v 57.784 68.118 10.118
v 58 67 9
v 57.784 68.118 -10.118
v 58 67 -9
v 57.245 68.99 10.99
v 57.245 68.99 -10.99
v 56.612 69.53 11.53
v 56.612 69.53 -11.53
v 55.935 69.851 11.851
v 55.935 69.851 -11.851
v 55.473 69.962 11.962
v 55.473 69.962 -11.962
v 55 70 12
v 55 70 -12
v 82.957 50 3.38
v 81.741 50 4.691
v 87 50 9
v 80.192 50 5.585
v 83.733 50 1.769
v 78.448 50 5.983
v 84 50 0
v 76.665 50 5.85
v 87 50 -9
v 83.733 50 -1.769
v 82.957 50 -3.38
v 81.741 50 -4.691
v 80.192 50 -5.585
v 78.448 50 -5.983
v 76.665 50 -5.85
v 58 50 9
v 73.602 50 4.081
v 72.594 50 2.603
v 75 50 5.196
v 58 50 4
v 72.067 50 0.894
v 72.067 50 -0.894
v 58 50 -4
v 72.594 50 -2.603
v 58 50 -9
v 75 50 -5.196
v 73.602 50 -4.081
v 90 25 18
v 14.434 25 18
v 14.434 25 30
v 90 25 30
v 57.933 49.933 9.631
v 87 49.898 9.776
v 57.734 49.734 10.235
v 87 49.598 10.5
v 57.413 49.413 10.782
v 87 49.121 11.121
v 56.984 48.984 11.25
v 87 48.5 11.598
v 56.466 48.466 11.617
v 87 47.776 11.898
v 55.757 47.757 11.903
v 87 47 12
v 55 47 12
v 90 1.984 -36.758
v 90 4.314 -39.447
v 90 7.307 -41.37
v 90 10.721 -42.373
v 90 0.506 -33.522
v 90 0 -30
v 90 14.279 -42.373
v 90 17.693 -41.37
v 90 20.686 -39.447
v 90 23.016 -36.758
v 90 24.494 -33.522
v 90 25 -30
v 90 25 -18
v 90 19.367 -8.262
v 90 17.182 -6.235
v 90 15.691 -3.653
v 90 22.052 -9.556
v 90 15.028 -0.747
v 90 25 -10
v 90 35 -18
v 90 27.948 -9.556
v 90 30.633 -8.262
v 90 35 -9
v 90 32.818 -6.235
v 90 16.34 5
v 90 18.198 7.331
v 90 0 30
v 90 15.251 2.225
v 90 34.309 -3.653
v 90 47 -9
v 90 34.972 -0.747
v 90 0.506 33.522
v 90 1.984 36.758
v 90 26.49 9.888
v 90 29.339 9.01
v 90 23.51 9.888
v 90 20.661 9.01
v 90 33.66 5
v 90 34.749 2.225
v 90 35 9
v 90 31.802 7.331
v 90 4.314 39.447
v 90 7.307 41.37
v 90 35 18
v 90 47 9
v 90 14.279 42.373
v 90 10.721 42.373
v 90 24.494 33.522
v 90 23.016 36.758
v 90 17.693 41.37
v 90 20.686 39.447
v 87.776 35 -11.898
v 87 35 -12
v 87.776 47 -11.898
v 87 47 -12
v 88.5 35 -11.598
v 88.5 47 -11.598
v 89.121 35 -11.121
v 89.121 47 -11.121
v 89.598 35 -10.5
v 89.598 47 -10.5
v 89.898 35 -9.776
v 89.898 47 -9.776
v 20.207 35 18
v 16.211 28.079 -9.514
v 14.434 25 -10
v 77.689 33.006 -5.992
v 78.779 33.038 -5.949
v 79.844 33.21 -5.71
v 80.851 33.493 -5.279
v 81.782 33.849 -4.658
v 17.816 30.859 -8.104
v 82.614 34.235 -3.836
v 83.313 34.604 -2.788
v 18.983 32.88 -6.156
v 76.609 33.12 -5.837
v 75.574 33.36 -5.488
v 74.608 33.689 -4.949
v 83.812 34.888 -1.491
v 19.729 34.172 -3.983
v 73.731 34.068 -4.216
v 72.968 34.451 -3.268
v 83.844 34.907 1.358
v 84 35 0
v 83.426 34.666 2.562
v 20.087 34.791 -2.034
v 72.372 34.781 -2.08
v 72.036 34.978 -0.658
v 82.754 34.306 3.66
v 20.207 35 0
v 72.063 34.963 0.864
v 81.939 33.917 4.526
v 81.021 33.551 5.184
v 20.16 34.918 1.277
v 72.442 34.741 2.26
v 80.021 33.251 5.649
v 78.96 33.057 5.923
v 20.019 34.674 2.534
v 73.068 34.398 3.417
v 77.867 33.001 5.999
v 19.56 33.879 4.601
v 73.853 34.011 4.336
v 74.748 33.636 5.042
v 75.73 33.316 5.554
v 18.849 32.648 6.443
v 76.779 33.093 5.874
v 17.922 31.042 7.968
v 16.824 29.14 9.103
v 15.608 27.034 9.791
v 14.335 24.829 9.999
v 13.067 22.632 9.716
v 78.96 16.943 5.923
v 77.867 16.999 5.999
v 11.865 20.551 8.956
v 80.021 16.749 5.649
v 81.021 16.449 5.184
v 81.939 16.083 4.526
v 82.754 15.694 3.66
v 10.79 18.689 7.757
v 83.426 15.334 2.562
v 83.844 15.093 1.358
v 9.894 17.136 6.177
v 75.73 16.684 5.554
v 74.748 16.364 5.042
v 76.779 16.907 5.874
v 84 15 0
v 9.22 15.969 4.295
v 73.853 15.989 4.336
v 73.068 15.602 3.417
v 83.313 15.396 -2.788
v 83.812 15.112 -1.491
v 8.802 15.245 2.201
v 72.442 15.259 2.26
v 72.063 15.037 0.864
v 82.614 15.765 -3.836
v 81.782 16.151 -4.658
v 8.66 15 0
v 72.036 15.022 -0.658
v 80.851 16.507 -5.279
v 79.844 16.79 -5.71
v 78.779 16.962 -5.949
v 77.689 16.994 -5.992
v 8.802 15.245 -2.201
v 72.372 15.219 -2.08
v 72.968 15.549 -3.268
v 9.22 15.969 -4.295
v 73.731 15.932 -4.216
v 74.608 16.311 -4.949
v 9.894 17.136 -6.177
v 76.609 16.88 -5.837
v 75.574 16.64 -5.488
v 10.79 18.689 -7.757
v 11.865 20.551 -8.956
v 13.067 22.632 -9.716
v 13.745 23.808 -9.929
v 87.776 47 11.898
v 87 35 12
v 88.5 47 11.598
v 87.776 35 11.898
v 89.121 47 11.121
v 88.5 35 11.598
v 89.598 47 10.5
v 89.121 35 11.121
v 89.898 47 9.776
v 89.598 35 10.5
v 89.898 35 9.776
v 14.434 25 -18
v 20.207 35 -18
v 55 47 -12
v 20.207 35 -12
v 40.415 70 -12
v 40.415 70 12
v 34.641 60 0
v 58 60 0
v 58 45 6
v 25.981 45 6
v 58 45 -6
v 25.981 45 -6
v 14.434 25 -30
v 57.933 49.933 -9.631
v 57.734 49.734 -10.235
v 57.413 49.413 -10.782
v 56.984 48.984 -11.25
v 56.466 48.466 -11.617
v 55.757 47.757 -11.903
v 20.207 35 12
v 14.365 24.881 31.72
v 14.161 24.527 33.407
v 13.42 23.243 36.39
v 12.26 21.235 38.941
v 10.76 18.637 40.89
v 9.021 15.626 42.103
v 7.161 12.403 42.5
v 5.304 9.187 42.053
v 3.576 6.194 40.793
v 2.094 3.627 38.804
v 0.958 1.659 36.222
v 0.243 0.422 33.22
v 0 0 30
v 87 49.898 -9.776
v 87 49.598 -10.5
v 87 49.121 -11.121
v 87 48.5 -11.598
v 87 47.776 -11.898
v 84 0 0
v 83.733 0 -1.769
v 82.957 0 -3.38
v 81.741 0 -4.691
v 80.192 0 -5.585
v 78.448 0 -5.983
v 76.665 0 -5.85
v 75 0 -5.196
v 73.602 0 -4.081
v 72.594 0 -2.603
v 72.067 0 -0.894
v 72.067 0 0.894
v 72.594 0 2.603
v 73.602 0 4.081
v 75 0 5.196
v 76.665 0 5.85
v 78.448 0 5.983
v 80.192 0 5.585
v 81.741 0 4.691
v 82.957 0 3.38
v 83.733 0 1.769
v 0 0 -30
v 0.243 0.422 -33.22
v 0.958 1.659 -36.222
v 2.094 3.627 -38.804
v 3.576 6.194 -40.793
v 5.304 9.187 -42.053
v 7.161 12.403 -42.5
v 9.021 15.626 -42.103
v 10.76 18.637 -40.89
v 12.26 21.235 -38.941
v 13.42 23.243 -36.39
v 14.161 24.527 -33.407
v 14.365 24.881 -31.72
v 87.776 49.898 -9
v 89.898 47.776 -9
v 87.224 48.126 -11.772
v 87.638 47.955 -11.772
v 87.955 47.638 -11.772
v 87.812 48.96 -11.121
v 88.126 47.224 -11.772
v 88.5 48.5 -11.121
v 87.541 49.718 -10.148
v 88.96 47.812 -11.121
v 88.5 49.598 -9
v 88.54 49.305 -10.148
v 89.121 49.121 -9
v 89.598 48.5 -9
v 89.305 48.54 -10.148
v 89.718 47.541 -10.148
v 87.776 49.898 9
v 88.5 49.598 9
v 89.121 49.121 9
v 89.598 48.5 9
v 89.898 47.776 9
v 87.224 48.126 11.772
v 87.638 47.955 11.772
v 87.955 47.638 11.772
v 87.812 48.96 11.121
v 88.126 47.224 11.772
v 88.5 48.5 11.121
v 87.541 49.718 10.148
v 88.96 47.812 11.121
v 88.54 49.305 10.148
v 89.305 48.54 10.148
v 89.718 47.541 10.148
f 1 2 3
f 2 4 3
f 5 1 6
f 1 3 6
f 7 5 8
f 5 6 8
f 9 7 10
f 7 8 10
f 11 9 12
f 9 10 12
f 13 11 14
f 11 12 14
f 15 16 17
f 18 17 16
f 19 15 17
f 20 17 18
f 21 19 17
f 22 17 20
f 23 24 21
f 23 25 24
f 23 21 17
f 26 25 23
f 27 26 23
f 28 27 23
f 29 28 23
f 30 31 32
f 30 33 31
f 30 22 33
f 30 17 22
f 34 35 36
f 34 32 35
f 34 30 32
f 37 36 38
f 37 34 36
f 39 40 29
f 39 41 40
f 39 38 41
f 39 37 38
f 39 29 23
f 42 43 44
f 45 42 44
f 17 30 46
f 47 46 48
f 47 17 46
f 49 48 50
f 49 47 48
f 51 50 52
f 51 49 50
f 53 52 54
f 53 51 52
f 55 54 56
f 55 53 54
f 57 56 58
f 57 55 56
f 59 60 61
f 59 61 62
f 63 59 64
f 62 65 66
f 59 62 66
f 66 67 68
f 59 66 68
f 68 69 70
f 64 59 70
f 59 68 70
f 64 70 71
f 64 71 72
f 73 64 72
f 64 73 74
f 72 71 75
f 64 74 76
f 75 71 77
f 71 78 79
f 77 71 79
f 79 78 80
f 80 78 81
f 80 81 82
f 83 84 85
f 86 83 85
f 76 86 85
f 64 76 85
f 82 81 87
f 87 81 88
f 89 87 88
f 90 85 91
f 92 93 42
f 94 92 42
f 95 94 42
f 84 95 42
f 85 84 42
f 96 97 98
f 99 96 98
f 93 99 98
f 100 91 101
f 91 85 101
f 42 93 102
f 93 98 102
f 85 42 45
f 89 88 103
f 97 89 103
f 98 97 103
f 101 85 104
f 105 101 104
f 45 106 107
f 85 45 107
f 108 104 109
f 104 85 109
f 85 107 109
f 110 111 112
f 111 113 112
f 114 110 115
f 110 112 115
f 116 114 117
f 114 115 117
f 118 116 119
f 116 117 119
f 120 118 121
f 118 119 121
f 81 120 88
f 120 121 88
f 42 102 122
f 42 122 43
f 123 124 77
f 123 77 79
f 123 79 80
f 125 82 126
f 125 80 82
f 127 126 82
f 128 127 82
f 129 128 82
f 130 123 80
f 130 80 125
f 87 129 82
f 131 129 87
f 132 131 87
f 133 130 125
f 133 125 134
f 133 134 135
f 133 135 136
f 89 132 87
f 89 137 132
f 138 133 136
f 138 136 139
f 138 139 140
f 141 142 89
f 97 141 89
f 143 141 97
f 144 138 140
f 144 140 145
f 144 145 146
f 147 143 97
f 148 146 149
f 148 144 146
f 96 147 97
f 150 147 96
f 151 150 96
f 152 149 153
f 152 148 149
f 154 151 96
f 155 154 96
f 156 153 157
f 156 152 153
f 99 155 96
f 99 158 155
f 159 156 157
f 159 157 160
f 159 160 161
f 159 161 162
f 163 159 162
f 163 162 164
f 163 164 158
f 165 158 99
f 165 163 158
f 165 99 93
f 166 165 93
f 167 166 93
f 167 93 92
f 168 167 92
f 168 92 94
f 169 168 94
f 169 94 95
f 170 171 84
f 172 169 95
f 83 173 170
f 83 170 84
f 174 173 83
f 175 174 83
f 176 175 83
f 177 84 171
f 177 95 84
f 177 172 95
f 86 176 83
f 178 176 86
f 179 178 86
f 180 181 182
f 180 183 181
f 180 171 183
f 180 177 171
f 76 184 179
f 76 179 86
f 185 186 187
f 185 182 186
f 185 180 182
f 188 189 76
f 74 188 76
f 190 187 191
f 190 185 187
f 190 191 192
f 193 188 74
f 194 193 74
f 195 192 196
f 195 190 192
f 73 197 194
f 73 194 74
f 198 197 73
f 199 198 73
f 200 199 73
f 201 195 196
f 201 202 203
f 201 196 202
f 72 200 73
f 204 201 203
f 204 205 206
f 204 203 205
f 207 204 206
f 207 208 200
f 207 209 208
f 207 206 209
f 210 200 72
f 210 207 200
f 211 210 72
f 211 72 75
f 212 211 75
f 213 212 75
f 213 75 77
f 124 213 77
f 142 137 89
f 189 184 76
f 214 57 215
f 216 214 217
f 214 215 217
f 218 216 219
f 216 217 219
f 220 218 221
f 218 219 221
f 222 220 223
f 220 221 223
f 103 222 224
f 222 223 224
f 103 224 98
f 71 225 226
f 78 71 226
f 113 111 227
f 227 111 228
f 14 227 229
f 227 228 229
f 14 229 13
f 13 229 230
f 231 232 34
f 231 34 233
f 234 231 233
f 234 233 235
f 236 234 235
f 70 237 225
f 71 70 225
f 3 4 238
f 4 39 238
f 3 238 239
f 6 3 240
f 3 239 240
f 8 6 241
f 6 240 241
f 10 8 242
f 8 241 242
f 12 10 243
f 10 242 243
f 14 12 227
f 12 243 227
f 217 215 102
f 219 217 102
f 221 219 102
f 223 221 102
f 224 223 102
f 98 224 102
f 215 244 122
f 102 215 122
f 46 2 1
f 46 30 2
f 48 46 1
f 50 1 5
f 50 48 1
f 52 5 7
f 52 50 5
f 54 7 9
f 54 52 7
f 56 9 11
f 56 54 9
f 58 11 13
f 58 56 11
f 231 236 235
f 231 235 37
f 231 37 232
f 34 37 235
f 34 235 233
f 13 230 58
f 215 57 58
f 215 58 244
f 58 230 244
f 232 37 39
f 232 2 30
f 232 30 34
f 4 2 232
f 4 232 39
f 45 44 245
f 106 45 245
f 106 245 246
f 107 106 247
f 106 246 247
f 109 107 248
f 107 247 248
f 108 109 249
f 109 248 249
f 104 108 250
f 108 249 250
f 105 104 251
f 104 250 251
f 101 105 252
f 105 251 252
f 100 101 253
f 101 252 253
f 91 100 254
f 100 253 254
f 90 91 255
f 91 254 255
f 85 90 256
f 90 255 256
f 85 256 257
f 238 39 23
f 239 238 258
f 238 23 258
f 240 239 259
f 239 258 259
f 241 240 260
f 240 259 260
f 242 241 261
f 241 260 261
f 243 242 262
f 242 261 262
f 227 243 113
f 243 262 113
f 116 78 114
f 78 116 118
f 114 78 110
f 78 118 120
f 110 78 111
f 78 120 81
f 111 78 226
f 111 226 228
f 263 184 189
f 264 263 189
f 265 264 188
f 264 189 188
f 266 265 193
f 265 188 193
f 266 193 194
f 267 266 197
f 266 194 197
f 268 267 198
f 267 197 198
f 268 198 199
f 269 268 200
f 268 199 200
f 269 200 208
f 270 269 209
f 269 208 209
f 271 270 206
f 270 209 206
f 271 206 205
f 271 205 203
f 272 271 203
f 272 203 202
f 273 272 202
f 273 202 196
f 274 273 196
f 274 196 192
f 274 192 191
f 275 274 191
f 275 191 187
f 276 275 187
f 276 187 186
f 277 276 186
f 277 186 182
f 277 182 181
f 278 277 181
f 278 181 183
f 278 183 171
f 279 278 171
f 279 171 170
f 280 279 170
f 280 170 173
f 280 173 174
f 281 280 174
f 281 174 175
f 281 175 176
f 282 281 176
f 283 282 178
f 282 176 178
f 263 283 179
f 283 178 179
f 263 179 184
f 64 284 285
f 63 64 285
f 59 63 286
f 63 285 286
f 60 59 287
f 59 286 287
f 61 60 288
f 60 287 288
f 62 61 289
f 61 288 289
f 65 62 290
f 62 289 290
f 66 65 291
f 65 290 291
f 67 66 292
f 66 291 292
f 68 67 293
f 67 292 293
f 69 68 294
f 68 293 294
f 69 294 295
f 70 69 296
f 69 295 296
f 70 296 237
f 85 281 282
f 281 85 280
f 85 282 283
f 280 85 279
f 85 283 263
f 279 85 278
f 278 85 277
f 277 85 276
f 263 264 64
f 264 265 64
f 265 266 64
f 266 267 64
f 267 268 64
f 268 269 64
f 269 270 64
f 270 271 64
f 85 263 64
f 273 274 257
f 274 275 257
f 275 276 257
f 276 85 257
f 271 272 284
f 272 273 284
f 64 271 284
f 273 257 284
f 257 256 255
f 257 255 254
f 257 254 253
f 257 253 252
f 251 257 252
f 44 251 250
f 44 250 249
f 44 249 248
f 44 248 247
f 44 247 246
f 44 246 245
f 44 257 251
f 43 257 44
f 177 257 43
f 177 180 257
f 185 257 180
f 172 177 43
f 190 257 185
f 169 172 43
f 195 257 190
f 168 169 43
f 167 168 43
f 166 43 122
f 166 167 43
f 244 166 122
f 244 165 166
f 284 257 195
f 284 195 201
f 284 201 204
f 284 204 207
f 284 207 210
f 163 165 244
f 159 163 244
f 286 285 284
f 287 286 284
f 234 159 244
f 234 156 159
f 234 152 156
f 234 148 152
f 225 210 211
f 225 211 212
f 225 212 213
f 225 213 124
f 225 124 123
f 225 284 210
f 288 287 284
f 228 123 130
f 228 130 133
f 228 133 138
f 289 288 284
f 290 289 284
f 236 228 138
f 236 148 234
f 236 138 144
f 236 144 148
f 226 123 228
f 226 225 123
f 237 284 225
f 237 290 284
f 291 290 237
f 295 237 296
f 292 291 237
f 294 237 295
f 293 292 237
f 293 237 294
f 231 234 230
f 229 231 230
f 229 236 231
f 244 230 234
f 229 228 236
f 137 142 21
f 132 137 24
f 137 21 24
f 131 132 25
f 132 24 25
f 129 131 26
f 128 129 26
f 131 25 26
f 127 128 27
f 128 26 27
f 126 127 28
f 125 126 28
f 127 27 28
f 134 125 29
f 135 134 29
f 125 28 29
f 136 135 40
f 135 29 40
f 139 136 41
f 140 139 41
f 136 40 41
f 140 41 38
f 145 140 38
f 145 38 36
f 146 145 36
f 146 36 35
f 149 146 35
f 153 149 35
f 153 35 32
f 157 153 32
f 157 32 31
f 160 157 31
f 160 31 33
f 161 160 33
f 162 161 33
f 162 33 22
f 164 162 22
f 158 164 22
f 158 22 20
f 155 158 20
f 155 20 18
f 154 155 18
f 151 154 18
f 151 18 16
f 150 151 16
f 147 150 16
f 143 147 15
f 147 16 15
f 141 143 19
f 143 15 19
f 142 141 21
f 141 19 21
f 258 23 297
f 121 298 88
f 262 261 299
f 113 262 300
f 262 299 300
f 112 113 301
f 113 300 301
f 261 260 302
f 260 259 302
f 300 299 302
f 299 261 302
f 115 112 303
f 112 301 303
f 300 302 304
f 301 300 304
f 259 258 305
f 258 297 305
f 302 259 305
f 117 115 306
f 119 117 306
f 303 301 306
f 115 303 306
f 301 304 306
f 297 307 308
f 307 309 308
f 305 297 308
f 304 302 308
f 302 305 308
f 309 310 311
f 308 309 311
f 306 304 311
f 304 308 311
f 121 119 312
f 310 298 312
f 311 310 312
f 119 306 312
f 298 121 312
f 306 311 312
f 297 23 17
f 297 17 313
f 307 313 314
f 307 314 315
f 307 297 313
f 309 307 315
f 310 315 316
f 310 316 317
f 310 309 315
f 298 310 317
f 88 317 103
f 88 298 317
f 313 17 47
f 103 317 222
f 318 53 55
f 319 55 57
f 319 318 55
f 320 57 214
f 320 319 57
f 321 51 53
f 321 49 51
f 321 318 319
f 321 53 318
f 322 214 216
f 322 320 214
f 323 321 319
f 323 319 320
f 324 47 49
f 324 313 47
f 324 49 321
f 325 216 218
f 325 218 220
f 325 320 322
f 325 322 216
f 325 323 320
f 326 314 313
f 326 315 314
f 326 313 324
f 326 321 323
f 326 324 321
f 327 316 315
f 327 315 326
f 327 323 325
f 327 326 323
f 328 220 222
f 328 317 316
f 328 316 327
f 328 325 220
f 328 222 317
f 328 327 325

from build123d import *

# Parameters (mm, degrees)
SKETCH1_R               = 10
BOSS_EXTRUDE1_DEPTH     = 90
CUT_EXTRUDE1_DEPTH      = 46
CUT_EXTRUDE1_DEPTH_BACK = 57
SKETCH3_W               = 32
SKETCH3_H               = 24
CUT_EXTRUDE2_DEPTH      = 20
BOSS_EXTRUDE2_DEPTH     = 32
SKETCH5_R               = 6
CUT_EXTRUDE3_DEPTH      = 78
FILLET3_R               = 3


with BuildPart() as part:
    # Sketch1 → Boss-Extrude1 (new body)
    with BuildSketch(Plane(origin=(0, 0, 0), x_dir=(0, 0, -1), z_dir=(1, 0, 0))):
        with BuildLine():
            Line((-30, 0), (30, 0))
            ThreePointArc((30, 0), (42.5, 12.5), (30, 25))
            Line((30, 25), (18, 25))
            Line((18, 25), (18, 35))
            Line((18, 35), (12, 35))
            Line((12, 35), (12, 70))
            Line((12, 70), (-12, 70))
            Line((-12, 70), (-12, 35))
            Line((-12, 35), (-18, 35))
            Line((-18, 35), (-18, 25))
            Line((-18, 25), (-30, 25))
            ThreePointArc((-30, 25), (-42.5, 12.5), (-30, 0))
        make_face()
        with Locations((0, 25)):
            Circle(SKETCH1_R, mode=Mode.SUBTRACT)
        Polygon((-6, 45), (6, 45), (0, 60), align=None, mode=Mode.SUBTRACT)
    extrude(amount=BOSS_EXTRUDE1_DEPTH)

    # Sketch2 → Cut-Extrude1 (cut, two sides)
    with BuildSketch(Plane.XY) as cut_extrude1_sk:
        Polygon((0, 0), (40.414518843, 70), (0, 70), align=None)
    extrude(amount=CUT_EXTRUDE1_DEPTH, mode=Mode.SUBTRACT)
    extrude(cut_extrude1_sk.sketch, amount=-CUT_EXTRUDE1_DEPTH_BACK, mode=Mode.SUBTRACT)

    # Sketch3 → Cut-Extrude2 (cut)
    with BuildSketch(Plane(origin=(0, 70, 0), x_dir=(1, 0, 0), z_dir=(0, 1, 0))):
        with Locations((74, 0)):
            Rectangle(SKETCH3_W, SKETCH3_H)
    extrude(amount=-CUT_EXTRUDE2_DEPTH, mode=Mode.SUBTRACT)

    # Sketch4 → Boss-Extrude2 (add)
    with BuildSketch(Plane(origin=(58, 0, 0), x_dir=(0, 0, -1), z_dir=(1, 0, 0))):
        Polygon((-6, 45), (-4, 50), (4, 50), (6, 45), align=None)
    extrude(amount=BOSS_EXTRUDE2_DEPTH)

    # Sketch5 → Cut-Extrude3 (cut)
    with BuildSketch(Plane(origin=(0, 50, 0), x_dir=(1, 0, 0), z_dir=(0, 1, 0))):
        with Locations((78, 0)):
            Circle(SKETCH5_R)
    extrude(amount=-CUT_EXTRUDE3_DEPTH, mode=Mode.SUBTRACT)

    # Fillet3
    fillet3_edges = [part.edges().sort_by_distance(p)[0] for p in [
        (90, 50, 0),
        (74, 50, 12),
        (58, 60, 12),
        (74, 50, -12),
        (58, 60, -12),
        (58, 70, 0),
        (90, 42.5, -12),
        (90, 42.5, 12),
    ]]
    fillet(fillet3_edges, radius=FILLET3_R)


solid = part.part
